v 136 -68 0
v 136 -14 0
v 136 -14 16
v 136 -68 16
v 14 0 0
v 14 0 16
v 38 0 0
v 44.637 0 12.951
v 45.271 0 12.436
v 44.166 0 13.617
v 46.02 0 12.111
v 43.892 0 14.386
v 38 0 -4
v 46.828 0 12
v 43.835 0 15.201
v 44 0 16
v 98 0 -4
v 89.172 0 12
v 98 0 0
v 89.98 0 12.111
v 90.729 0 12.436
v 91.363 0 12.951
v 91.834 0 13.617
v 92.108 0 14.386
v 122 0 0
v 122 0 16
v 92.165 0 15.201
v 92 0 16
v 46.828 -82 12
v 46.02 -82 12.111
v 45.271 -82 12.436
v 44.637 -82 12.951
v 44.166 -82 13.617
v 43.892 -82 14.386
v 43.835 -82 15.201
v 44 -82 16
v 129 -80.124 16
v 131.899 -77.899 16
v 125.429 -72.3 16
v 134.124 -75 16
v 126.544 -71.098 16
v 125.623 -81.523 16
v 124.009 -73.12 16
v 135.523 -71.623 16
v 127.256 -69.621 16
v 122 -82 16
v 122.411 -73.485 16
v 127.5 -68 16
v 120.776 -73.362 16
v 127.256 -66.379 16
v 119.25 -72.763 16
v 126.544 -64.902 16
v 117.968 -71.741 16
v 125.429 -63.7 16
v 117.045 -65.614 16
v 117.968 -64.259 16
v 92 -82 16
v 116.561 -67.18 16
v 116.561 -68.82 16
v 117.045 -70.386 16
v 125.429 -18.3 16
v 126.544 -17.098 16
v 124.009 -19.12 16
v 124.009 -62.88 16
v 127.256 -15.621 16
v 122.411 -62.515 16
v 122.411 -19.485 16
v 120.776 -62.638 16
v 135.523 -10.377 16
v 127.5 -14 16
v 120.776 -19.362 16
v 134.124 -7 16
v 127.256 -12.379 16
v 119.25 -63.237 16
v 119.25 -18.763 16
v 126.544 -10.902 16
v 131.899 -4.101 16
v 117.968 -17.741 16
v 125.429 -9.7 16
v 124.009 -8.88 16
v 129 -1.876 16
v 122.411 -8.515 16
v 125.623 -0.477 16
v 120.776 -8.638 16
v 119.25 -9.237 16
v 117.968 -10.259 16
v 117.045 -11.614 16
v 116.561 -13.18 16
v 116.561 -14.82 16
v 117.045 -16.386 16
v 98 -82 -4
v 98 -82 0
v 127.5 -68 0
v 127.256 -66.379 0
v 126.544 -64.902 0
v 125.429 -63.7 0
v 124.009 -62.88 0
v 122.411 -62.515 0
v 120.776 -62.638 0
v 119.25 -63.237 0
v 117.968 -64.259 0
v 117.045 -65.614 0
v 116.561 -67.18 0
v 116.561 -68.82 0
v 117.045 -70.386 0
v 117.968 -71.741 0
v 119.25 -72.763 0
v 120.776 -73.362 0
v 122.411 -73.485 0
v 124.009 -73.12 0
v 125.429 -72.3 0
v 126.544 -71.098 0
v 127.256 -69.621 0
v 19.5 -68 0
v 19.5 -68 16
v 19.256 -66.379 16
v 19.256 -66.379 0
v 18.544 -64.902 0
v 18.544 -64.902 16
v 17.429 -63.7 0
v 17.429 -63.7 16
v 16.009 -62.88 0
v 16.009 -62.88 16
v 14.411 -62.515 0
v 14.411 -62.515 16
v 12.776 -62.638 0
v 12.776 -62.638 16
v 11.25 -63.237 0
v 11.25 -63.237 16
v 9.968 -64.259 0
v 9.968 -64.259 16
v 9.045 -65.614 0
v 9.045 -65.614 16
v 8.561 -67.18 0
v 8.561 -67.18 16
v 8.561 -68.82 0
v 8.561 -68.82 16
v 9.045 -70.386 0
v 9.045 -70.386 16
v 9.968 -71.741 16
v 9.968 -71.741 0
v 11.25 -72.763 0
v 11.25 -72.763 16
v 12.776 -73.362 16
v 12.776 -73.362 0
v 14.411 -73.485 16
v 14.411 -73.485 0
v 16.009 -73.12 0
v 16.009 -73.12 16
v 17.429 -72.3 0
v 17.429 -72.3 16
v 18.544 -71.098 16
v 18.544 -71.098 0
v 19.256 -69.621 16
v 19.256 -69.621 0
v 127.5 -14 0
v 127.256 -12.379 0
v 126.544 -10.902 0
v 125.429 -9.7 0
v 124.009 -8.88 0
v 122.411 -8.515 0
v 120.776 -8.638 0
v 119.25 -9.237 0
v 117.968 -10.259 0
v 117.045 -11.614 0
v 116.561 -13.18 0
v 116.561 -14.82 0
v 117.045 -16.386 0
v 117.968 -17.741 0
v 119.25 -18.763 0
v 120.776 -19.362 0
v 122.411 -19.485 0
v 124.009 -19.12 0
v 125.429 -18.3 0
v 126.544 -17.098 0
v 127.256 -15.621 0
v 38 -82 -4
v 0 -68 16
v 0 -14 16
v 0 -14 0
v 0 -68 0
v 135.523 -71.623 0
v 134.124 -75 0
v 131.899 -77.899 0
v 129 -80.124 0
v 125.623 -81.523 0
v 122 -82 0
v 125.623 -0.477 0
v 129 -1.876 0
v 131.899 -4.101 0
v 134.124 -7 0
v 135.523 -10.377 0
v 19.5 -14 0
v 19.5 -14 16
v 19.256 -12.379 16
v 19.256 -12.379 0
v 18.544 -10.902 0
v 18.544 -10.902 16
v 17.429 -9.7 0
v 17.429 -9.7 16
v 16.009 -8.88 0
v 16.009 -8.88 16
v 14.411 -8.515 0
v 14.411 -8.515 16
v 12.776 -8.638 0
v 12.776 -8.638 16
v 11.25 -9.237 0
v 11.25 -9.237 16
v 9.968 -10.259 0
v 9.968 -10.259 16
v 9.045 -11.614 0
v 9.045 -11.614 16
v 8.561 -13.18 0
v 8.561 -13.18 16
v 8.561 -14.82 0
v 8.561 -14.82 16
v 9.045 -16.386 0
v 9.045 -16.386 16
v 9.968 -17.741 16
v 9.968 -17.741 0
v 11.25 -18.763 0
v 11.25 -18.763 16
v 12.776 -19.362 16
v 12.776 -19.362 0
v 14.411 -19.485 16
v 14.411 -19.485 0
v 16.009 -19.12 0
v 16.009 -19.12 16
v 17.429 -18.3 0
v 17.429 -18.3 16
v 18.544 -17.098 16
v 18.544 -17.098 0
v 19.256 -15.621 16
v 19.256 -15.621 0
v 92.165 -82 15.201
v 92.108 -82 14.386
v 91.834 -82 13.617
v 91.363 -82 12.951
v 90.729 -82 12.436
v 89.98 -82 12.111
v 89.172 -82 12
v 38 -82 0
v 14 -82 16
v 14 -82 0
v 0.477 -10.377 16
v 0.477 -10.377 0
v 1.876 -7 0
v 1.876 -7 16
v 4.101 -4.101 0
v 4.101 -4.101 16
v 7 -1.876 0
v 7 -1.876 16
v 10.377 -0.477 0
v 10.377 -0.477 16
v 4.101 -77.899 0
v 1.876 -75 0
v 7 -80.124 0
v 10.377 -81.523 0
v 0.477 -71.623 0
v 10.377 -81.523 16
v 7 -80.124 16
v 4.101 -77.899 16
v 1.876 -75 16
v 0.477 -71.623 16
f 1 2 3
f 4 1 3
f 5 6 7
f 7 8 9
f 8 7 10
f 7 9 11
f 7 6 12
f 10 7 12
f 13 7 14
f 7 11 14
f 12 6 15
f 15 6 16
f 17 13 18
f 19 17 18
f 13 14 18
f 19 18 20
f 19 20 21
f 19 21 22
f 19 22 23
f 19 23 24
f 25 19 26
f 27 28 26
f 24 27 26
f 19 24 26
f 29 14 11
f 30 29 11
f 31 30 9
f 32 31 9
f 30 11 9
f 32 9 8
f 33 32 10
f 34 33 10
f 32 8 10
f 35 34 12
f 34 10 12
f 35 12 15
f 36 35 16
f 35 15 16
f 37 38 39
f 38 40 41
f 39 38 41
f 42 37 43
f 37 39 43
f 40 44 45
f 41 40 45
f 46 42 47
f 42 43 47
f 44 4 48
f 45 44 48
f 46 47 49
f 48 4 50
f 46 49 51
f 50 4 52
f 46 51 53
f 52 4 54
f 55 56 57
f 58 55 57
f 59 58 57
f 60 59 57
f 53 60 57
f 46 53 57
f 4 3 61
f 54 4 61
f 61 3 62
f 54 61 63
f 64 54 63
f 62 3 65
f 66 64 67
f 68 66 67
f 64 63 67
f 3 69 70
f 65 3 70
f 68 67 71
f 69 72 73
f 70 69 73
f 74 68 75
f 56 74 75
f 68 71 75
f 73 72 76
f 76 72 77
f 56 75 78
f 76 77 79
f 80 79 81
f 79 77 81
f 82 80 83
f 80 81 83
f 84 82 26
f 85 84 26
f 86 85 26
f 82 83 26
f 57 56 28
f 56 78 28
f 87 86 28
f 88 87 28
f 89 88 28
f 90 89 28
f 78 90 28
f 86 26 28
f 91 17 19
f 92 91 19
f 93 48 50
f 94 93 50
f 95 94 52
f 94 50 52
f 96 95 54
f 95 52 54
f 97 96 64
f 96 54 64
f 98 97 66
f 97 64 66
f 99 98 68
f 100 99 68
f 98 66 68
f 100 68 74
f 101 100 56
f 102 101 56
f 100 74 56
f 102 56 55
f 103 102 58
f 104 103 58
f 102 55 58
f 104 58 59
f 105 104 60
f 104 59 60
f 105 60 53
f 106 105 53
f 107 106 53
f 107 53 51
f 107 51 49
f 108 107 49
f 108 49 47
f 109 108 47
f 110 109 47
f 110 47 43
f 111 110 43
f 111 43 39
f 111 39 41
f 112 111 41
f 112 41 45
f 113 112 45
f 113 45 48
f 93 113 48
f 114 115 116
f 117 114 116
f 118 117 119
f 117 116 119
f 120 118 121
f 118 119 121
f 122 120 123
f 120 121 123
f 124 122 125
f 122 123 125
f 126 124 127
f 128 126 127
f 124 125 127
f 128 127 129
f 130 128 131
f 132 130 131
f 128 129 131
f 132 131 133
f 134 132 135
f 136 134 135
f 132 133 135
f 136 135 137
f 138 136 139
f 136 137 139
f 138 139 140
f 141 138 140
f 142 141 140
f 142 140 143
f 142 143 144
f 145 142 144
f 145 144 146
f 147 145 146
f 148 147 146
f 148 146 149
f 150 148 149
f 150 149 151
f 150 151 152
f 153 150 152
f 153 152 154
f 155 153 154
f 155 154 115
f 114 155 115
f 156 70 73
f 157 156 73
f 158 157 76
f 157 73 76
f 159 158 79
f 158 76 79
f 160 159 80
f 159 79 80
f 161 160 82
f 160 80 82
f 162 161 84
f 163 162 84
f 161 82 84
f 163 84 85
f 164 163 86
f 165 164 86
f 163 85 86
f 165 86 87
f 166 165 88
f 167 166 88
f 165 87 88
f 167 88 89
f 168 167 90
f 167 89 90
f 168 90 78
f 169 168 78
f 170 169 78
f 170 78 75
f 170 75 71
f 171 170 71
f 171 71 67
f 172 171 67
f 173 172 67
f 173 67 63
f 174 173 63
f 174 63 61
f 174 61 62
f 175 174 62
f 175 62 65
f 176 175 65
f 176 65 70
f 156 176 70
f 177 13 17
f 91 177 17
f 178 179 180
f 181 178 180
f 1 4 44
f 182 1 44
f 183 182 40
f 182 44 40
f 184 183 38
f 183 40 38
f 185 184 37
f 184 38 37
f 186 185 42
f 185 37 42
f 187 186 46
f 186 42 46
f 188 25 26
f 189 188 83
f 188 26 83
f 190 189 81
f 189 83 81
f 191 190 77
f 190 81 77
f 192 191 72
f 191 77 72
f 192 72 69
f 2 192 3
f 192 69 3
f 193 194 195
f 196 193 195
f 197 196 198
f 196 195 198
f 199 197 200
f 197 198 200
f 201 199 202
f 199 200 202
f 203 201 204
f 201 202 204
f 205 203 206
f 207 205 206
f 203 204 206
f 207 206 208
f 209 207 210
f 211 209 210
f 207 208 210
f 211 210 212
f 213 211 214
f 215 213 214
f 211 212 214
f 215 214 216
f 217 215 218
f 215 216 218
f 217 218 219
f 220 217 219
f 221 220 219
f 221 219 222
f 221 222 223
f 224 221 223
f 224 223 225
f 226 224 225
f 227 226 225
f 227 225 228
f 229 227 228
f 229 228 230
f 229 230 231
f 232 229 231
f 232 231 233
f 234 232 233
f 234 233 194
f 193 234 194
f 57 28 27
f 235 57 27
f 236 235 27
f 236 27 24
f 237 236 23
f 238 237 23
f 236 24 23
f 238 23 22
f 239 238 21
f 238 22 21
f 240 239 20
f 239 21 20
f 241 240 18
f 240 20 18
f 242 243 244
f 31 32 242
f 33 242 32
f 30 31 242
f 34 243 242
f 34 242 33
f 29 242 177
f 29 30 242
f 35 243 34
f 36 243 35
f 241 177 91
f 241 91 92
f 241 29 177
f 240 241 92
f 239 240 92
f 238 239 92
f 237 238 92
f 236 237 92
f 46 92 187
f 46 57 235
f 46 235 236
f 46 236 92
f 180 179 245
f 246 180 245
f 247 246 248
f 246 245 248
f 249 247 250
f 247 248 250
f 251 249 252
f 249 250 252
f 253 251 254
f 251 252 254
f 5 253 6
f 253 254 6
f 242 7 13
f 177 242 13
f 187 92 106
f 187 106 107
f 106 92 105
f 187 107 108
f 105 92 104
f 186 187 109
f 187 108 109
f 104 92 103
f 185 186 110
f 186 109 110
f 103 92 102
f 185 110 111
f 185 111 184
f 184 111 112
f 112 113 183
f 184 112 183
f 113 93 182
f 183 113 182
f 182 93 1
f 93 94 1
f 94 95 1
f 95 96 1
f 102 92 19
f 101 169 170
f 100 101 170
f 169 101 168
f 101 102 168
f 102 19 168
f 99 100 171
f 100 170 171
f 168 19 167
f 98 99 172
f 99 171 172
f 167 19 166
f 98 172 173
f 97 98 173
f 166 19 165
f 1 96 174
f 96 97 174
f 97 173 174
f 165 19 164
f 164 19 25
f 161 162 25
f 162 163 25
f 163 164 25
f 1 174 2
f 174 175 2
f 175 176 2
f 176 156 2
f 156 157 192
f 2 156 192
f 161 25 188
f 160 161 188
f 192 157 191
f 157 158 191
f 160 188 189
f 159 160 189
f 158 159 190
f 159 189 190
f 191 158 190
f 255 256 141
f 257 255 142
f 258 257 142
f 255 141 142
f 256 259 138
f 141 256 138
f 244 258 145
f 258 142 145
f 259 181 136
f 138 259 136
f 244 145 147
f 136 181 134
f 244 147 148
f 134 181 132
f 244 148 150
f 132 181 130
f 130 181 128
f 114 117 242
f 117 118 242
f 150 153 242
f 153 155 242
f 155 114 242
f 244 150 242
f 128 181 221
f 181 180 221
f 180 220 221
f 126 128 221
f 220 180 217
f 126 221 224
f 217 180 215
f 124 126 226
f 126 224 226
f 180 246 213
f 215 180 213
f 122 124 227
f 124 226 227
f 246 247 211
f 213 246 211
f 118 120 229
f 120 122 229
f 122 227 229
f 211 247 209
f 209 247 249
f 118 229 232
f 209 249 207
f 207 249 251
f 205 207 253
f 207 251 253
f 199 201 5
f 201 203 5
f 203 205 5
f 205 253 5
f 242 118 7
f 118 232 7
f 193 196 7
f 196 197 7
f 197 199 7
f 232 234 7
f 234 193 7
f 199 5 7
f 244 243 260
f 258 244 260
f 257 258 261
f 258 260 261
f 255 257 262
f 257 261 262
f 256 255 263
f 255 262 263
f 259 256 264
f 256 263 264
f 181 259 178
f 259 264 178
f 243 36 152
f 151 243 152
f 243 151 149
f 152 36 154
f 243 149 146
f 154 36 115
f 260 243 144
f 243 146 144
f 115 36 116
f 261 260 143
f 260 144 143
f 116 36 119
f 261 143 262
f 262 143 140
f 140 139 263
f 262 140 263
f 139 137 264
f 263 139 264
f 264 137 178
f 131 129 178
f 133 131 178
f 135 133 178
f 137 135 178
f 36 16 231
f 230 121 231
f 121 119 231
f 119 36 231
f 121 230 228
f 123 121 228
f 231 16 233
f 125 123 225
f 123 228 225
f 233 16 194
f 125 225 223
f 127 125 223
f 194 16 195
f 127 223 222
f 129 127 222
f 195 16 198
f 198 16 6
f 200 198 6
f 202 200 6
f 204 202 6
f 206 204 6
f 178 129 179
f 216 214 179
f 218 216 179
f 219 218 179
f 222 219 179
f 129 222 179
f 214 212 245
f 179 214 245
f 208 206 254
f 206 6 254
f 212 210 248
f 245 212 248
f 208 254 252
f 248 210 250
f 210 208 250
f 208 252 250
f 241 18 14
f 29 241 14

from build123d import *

# Parameters (mm, degrees)
F1_DEPTH = 82
F2_R     = 5.5
F3_DEPTH = 20.001
F5_DEPTH = 20.001


with BuildPart() as f1:
    # F0 (on Front) → F1 (new body)
    with BuildSketch(Plane.XZ):
        with BuildLine():
            Line((0, 16), (0, 0))
            Line((0, 0), (38, 0))
            Line((38, 0), (38, -4))
            Line((38, -4), (98, -4))
            Line((98, -4), (98, 0))
            Line((98, 0), (136, 0))
            Line((136, 0), (136, 16))
            Line((136, 16), (92, 16))
            ThreePointArc((92, 16), (91.621063, 13.267949), (89.171573, 12))
            Line((89.171573, 12), (46.828427, 12))
            ThreePointArc((46.828427, 12), (44.378937, 13.267949), (44, 16))
            Line((44, 16), (0, 16))
        make_face()
    extrude(amount=F1_DEPTH)

    # F2 (on face) → F3 (cut, through all)
    with BuildSketch(Plane.XY.offset(16)):
        with Locations((14, -14)):
            Circle(F2_R)
        with Locations((14, -68)):
            Circle(F2_R)
        with Locations((122, -14)):
            Circle(F2_R)
        with Locations((122, -68)):
            Circle(F2_R)
    extrude(amount=-F3_DEPTH, mode=Mode.SUBTRACT)

    # F4 (on face) → F5 (cut, through all)
    with BuildSketch(Plane.XY.offset(16)):
        with BuildLine():
            Line((14, 0), (0, 0))
            Line((0, 0), (0, -14))
            ThreePointArc((0, -14), (4.100505, -4.100505), (14, 0))
        make_face()
        with BuildLine():
            Line((0, -68), (0, -82))
            Line((0, -82), (14, -82))
            ThreePointArc((14, -82), (4.100505, -77.899495), (0, -68))
        make_face()
        with BuildLine():
            Line((136, 0), (122, 0))
            ThreePointArc((122, 0), (131.899495, -4.100505), (136, -14))
            Line((136, -14), (136, 0))
        make_face()
        with BuildLine():
            Line((136, -82), (136, -68))
            ThreePointArc((136, -68), (131.899495, -77.899495), (122, -82))
            Line((122, -82), (136, -82))
        make_face()
    extrude(amount=-F5_DEPTH, mode=Mode.SUBTRACT)


solid = f1.part
